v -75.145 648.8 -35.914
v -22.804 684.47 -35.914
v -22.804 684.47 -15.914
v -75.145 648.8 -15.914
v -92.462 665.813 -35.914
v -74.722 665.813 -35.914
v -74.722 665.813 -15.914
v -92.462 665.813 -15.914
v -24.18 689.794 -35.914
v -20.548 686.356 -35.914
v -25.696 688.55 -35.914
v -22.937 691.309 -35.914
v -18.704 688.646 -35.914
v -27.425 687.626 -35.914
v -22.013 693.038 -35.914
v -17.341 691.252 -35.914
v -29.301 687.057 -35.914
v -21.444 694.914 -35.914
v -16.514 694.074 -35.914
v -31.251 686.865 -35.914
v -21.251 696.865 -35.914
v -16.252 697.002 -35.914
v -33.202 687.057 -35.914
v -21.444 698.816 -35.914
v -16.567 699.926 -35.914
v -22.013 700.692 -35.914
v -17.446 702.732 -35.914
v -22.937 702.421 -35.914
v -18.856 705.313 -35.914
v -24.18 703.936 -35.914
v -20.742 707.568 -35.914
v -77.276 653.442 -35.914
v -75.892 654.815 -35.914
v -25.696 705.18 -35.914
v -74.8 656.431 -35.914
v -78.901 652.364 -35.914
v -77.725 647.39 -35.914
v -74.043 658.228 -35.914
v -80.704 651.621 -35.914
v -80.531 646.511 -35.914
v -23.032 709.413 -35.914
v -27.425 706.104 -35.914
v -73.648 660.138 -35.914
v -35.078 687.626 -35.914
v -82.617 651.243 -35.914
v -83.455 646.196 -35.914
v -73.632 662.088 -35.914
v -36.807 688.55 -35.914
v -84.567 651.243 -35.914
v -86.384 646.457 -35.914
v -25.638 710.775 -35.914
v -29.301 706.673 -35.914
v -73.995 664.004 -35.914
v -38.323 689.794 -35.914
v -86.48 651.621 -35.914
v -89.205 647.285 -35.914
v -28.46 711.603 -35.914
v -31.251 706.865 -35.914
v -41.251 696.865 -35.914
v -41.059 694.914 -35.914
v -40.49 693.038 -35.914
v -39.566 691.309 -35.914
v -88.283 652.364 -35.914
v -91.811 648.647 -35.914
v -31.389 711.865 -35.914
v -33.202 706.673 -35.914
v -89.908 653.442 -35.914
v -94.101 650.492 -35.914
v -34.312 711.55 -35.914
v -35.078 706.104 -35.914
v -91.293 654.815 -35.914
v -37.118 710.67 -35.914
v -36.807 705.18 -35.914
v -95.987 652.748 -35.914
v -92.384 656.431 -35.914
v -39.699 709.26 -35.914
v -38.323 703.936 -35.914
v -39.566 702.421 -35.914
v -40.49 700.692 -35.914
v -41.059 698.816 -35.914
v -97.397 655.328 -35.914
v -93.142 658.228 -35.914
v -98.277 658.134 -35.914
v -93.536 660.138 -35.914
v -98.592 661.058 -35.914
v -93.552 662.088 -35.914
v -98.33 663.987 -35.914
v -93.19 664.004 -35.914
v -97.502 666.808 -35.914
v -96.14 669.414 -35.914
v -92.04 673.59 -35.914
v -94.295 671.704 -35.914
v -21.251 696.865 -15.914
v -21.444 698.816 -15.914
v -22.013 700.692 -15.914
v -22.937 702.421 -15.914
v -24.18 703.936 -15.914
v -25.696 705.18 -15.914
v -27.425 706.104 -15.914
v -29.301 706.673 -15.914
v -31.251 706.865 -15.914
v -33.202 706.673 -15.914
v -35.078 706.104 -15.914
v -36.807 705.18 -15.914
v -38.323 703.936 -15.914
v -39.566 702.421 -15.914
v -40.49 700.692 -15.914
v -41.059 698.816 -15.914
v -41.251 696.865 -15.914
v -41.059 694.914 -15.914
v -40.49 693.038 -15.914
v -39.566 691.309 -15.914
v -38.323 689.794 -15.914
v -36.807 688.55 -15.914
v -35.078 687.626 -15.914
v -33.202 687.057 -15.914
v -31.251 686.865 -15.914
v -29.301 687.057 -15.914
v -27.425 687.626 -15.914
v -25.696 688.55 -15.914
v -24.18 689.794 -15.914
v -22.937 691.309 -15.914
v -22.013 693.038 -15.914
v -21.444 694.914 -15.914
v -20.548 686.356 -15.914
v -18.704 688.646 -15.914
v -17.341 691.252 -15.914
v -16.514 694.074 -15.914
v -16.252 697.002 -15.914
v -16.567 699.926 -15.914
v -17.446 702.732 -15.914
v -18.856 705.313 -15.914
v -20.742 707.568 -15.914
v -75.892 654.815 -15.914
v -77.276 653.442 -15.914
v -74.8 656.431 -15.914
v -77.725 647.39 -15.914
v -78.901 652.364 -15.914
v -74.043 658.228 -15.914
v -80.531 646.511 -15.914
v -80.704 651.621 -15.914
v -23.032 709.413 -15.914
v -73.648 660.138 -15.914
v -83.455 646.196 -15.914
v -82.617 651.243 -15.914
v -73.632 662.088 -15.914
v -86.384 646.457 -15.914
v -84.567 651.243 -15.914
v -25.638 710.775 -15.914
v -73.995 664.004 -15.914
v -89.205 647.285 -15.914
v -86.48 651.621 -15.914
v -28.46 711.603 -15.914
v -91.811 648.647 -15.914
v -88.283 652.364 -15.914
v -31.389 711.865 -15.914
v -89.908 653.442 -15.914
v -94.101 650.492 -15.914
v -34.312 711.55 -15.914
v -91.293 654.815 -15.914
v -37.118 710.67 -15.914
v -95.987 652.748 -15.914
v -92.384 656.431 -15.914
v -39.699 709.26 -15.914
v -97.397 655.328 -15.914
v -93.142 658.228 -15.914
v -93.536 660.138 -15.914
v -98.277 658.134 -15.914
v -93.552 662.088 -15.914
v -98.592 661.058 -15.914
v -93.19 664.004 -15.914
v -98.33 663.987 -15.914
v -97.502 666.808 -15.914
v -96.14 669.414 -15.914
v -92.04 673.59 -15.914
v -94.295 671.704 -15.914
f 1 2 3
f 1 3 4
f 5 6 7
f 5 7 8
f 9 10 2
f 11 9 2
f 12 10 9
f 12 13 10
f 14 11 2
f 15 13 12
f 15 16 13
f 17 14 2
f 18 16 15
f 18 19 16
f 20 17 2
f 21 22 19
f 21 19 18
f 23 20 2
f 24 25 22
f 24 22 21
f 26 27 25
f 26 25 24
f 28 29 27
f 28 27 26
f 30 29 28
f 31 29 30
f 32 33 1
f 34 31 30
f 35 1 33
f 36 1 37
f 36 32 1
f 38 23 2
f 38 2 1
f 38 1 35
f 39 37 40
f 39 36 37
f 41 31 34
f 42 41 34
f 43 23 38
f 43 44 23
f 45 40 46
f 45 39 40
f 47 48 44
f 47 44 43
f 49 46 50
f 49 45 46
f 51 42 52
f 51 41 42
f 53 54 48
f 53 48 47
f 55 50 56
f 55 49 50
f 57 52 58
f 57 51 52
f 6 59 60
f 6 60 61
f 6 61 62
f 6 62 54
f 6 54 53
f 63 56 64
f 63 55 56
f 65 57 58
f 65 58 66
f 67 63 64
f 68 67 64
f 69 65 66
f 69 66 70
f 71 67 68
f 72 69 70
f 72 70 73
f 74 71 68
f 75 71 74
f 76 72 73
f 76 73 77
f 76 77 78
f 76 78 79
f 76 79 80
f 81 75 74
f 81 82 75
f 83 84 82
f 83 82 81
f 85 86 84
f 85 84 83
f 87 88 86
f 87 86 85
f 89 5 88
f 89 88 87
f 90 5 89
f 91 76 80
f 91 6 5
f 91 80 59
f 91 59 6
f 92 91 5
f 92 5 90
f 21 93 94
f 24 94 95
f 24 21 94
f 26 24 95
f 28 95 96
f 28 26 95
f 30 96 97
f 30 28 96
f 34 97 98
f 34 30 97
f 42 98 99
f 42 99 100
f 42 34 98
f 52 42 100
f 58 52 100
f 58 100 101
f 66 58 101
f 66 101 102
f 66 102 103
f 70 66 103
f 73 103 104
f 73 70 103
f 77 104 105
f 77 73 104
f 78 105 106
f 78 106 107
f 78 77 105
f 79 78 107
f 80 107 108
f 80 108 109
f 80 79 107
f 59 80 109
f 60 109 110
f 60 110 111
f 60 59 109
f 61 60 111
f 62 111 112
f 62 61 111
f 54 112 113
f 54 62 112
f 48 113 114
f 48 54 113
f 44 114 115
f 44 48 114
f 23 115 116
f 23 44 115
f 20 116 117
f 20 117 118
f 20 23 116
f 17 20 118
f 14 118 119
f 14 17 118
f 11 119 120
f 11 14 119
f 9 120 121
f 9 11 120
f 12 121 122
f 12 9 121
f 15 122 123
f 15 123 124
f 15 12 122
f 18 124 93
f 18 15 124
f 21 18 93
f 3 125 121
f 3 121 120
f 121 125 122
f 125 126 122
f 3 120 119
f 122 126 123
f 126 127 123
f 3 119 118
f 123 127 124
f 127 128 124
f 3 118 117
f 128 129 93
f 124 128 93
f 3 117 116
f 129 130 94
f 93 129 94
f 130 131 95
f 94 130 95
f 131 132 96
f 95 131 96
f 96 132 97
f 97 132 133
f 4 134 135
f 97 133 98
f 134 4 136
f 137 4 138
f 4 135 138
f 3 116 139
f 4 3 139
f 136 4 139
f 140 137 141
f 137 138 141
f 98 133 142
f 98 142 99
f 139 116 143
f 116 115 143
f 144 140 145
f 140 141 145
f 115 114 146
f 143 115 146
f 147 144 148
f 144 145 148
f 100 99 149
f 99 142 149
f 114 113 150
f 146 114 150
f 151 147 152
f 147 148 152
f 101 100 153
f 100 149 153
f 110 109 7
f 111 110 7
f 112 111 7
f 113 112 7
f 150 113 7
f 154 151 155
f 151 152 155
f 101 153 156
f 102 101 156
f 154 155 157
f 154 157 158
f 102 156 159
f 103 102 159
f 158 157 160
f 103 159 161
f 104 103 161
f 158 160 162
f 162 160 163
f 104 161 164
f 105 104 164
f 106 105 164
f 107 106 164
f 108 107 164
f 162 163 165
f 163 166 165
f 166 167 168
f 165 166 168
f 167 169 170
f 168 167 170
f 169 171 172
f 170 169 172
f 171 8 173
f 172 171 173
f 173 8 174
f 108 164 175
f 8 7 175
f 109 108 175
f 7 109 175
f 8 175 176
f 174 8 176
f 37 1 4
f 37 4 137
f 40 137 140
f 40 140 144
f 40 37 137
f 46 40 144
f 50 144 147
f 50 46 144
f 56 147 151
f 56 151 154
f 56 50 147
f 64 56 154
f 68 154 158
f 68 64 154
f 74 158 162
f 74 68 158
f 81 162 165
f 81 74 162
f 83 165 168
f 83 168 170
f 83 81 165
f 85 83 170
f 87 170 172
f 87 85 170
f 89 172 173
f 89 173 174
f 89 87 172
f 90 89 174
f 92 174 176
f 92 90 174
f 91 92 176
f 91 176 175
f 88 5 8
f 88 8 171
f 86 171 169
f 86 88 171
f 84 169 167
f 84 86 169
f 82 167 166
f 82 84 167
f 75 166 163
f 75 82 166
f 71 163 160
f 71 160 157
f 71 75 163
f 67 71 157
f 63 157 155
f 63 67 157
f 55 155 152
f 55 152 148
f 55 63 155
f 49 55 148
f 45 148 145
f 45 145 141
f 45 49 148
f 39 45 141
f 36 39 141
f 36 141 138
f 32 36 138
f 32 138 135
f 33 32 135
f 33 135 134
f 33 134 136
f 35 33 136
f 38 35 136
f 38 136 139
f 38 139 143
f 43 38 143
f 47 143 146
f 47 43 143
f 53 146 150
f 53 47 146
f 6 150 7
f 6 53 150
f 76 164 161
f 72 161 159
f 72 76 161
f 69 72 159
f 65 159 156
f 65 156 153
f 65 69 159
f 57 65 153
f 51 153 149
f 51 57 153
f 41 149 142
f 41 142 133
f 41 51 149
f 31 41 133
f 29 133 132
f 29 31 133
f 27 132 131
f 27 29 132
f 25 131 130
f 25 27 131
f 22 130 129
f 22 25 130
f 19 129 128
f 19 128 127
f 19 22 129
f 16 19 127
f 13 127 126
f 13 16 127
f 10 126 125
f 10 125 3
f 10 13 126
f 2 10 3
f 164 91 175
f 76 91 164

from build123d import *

# Parameters (mm, degrees)
SKETCH_1_R      = 10
EXTRUDE_1_DEPTH = 20


with BuildPart() as part:
    # 草图1 → 凸台-拉伸1 (new body)
    with BuildSketch(Plane.XY.offset(-35.913663537)):
        with BuildLine():
            Line((-92.03956228, 673.590403503), (-39.698813198, 709.260436791))
            ThreePointArc((-39.698813198, 709.260436791), (-18.856217474, 705.312500182), (-22.804154083, 684.469904458))
            Line((-22.804154083, 684.469904458), (-75.144903165, 648.799871169))
            ThreePointArc((-75.144903165, 648.799871169), (-95.98749889, 652.747807779), (-92.03956228, 673.590403503))
        make_face()
        with Locations((-31.251483641, 696.865170625)):
            Circle(SKETCH_1_R, mode=Mode.SUBTRACT)
        with BuildLine():
            Line((-74.722353088, 665.813062766), (-92.462112357, 665.813062766))
            ThreePointArc((-92.462112357, 665.813062766), (-83.592232723, 651.195137336), (-74.722353088, 665.813062766))
        make_face(mode=Mode.SUBTRACT)
    extrude(amount=EXTRUDE_1_DEPTH)


solid = part.part
